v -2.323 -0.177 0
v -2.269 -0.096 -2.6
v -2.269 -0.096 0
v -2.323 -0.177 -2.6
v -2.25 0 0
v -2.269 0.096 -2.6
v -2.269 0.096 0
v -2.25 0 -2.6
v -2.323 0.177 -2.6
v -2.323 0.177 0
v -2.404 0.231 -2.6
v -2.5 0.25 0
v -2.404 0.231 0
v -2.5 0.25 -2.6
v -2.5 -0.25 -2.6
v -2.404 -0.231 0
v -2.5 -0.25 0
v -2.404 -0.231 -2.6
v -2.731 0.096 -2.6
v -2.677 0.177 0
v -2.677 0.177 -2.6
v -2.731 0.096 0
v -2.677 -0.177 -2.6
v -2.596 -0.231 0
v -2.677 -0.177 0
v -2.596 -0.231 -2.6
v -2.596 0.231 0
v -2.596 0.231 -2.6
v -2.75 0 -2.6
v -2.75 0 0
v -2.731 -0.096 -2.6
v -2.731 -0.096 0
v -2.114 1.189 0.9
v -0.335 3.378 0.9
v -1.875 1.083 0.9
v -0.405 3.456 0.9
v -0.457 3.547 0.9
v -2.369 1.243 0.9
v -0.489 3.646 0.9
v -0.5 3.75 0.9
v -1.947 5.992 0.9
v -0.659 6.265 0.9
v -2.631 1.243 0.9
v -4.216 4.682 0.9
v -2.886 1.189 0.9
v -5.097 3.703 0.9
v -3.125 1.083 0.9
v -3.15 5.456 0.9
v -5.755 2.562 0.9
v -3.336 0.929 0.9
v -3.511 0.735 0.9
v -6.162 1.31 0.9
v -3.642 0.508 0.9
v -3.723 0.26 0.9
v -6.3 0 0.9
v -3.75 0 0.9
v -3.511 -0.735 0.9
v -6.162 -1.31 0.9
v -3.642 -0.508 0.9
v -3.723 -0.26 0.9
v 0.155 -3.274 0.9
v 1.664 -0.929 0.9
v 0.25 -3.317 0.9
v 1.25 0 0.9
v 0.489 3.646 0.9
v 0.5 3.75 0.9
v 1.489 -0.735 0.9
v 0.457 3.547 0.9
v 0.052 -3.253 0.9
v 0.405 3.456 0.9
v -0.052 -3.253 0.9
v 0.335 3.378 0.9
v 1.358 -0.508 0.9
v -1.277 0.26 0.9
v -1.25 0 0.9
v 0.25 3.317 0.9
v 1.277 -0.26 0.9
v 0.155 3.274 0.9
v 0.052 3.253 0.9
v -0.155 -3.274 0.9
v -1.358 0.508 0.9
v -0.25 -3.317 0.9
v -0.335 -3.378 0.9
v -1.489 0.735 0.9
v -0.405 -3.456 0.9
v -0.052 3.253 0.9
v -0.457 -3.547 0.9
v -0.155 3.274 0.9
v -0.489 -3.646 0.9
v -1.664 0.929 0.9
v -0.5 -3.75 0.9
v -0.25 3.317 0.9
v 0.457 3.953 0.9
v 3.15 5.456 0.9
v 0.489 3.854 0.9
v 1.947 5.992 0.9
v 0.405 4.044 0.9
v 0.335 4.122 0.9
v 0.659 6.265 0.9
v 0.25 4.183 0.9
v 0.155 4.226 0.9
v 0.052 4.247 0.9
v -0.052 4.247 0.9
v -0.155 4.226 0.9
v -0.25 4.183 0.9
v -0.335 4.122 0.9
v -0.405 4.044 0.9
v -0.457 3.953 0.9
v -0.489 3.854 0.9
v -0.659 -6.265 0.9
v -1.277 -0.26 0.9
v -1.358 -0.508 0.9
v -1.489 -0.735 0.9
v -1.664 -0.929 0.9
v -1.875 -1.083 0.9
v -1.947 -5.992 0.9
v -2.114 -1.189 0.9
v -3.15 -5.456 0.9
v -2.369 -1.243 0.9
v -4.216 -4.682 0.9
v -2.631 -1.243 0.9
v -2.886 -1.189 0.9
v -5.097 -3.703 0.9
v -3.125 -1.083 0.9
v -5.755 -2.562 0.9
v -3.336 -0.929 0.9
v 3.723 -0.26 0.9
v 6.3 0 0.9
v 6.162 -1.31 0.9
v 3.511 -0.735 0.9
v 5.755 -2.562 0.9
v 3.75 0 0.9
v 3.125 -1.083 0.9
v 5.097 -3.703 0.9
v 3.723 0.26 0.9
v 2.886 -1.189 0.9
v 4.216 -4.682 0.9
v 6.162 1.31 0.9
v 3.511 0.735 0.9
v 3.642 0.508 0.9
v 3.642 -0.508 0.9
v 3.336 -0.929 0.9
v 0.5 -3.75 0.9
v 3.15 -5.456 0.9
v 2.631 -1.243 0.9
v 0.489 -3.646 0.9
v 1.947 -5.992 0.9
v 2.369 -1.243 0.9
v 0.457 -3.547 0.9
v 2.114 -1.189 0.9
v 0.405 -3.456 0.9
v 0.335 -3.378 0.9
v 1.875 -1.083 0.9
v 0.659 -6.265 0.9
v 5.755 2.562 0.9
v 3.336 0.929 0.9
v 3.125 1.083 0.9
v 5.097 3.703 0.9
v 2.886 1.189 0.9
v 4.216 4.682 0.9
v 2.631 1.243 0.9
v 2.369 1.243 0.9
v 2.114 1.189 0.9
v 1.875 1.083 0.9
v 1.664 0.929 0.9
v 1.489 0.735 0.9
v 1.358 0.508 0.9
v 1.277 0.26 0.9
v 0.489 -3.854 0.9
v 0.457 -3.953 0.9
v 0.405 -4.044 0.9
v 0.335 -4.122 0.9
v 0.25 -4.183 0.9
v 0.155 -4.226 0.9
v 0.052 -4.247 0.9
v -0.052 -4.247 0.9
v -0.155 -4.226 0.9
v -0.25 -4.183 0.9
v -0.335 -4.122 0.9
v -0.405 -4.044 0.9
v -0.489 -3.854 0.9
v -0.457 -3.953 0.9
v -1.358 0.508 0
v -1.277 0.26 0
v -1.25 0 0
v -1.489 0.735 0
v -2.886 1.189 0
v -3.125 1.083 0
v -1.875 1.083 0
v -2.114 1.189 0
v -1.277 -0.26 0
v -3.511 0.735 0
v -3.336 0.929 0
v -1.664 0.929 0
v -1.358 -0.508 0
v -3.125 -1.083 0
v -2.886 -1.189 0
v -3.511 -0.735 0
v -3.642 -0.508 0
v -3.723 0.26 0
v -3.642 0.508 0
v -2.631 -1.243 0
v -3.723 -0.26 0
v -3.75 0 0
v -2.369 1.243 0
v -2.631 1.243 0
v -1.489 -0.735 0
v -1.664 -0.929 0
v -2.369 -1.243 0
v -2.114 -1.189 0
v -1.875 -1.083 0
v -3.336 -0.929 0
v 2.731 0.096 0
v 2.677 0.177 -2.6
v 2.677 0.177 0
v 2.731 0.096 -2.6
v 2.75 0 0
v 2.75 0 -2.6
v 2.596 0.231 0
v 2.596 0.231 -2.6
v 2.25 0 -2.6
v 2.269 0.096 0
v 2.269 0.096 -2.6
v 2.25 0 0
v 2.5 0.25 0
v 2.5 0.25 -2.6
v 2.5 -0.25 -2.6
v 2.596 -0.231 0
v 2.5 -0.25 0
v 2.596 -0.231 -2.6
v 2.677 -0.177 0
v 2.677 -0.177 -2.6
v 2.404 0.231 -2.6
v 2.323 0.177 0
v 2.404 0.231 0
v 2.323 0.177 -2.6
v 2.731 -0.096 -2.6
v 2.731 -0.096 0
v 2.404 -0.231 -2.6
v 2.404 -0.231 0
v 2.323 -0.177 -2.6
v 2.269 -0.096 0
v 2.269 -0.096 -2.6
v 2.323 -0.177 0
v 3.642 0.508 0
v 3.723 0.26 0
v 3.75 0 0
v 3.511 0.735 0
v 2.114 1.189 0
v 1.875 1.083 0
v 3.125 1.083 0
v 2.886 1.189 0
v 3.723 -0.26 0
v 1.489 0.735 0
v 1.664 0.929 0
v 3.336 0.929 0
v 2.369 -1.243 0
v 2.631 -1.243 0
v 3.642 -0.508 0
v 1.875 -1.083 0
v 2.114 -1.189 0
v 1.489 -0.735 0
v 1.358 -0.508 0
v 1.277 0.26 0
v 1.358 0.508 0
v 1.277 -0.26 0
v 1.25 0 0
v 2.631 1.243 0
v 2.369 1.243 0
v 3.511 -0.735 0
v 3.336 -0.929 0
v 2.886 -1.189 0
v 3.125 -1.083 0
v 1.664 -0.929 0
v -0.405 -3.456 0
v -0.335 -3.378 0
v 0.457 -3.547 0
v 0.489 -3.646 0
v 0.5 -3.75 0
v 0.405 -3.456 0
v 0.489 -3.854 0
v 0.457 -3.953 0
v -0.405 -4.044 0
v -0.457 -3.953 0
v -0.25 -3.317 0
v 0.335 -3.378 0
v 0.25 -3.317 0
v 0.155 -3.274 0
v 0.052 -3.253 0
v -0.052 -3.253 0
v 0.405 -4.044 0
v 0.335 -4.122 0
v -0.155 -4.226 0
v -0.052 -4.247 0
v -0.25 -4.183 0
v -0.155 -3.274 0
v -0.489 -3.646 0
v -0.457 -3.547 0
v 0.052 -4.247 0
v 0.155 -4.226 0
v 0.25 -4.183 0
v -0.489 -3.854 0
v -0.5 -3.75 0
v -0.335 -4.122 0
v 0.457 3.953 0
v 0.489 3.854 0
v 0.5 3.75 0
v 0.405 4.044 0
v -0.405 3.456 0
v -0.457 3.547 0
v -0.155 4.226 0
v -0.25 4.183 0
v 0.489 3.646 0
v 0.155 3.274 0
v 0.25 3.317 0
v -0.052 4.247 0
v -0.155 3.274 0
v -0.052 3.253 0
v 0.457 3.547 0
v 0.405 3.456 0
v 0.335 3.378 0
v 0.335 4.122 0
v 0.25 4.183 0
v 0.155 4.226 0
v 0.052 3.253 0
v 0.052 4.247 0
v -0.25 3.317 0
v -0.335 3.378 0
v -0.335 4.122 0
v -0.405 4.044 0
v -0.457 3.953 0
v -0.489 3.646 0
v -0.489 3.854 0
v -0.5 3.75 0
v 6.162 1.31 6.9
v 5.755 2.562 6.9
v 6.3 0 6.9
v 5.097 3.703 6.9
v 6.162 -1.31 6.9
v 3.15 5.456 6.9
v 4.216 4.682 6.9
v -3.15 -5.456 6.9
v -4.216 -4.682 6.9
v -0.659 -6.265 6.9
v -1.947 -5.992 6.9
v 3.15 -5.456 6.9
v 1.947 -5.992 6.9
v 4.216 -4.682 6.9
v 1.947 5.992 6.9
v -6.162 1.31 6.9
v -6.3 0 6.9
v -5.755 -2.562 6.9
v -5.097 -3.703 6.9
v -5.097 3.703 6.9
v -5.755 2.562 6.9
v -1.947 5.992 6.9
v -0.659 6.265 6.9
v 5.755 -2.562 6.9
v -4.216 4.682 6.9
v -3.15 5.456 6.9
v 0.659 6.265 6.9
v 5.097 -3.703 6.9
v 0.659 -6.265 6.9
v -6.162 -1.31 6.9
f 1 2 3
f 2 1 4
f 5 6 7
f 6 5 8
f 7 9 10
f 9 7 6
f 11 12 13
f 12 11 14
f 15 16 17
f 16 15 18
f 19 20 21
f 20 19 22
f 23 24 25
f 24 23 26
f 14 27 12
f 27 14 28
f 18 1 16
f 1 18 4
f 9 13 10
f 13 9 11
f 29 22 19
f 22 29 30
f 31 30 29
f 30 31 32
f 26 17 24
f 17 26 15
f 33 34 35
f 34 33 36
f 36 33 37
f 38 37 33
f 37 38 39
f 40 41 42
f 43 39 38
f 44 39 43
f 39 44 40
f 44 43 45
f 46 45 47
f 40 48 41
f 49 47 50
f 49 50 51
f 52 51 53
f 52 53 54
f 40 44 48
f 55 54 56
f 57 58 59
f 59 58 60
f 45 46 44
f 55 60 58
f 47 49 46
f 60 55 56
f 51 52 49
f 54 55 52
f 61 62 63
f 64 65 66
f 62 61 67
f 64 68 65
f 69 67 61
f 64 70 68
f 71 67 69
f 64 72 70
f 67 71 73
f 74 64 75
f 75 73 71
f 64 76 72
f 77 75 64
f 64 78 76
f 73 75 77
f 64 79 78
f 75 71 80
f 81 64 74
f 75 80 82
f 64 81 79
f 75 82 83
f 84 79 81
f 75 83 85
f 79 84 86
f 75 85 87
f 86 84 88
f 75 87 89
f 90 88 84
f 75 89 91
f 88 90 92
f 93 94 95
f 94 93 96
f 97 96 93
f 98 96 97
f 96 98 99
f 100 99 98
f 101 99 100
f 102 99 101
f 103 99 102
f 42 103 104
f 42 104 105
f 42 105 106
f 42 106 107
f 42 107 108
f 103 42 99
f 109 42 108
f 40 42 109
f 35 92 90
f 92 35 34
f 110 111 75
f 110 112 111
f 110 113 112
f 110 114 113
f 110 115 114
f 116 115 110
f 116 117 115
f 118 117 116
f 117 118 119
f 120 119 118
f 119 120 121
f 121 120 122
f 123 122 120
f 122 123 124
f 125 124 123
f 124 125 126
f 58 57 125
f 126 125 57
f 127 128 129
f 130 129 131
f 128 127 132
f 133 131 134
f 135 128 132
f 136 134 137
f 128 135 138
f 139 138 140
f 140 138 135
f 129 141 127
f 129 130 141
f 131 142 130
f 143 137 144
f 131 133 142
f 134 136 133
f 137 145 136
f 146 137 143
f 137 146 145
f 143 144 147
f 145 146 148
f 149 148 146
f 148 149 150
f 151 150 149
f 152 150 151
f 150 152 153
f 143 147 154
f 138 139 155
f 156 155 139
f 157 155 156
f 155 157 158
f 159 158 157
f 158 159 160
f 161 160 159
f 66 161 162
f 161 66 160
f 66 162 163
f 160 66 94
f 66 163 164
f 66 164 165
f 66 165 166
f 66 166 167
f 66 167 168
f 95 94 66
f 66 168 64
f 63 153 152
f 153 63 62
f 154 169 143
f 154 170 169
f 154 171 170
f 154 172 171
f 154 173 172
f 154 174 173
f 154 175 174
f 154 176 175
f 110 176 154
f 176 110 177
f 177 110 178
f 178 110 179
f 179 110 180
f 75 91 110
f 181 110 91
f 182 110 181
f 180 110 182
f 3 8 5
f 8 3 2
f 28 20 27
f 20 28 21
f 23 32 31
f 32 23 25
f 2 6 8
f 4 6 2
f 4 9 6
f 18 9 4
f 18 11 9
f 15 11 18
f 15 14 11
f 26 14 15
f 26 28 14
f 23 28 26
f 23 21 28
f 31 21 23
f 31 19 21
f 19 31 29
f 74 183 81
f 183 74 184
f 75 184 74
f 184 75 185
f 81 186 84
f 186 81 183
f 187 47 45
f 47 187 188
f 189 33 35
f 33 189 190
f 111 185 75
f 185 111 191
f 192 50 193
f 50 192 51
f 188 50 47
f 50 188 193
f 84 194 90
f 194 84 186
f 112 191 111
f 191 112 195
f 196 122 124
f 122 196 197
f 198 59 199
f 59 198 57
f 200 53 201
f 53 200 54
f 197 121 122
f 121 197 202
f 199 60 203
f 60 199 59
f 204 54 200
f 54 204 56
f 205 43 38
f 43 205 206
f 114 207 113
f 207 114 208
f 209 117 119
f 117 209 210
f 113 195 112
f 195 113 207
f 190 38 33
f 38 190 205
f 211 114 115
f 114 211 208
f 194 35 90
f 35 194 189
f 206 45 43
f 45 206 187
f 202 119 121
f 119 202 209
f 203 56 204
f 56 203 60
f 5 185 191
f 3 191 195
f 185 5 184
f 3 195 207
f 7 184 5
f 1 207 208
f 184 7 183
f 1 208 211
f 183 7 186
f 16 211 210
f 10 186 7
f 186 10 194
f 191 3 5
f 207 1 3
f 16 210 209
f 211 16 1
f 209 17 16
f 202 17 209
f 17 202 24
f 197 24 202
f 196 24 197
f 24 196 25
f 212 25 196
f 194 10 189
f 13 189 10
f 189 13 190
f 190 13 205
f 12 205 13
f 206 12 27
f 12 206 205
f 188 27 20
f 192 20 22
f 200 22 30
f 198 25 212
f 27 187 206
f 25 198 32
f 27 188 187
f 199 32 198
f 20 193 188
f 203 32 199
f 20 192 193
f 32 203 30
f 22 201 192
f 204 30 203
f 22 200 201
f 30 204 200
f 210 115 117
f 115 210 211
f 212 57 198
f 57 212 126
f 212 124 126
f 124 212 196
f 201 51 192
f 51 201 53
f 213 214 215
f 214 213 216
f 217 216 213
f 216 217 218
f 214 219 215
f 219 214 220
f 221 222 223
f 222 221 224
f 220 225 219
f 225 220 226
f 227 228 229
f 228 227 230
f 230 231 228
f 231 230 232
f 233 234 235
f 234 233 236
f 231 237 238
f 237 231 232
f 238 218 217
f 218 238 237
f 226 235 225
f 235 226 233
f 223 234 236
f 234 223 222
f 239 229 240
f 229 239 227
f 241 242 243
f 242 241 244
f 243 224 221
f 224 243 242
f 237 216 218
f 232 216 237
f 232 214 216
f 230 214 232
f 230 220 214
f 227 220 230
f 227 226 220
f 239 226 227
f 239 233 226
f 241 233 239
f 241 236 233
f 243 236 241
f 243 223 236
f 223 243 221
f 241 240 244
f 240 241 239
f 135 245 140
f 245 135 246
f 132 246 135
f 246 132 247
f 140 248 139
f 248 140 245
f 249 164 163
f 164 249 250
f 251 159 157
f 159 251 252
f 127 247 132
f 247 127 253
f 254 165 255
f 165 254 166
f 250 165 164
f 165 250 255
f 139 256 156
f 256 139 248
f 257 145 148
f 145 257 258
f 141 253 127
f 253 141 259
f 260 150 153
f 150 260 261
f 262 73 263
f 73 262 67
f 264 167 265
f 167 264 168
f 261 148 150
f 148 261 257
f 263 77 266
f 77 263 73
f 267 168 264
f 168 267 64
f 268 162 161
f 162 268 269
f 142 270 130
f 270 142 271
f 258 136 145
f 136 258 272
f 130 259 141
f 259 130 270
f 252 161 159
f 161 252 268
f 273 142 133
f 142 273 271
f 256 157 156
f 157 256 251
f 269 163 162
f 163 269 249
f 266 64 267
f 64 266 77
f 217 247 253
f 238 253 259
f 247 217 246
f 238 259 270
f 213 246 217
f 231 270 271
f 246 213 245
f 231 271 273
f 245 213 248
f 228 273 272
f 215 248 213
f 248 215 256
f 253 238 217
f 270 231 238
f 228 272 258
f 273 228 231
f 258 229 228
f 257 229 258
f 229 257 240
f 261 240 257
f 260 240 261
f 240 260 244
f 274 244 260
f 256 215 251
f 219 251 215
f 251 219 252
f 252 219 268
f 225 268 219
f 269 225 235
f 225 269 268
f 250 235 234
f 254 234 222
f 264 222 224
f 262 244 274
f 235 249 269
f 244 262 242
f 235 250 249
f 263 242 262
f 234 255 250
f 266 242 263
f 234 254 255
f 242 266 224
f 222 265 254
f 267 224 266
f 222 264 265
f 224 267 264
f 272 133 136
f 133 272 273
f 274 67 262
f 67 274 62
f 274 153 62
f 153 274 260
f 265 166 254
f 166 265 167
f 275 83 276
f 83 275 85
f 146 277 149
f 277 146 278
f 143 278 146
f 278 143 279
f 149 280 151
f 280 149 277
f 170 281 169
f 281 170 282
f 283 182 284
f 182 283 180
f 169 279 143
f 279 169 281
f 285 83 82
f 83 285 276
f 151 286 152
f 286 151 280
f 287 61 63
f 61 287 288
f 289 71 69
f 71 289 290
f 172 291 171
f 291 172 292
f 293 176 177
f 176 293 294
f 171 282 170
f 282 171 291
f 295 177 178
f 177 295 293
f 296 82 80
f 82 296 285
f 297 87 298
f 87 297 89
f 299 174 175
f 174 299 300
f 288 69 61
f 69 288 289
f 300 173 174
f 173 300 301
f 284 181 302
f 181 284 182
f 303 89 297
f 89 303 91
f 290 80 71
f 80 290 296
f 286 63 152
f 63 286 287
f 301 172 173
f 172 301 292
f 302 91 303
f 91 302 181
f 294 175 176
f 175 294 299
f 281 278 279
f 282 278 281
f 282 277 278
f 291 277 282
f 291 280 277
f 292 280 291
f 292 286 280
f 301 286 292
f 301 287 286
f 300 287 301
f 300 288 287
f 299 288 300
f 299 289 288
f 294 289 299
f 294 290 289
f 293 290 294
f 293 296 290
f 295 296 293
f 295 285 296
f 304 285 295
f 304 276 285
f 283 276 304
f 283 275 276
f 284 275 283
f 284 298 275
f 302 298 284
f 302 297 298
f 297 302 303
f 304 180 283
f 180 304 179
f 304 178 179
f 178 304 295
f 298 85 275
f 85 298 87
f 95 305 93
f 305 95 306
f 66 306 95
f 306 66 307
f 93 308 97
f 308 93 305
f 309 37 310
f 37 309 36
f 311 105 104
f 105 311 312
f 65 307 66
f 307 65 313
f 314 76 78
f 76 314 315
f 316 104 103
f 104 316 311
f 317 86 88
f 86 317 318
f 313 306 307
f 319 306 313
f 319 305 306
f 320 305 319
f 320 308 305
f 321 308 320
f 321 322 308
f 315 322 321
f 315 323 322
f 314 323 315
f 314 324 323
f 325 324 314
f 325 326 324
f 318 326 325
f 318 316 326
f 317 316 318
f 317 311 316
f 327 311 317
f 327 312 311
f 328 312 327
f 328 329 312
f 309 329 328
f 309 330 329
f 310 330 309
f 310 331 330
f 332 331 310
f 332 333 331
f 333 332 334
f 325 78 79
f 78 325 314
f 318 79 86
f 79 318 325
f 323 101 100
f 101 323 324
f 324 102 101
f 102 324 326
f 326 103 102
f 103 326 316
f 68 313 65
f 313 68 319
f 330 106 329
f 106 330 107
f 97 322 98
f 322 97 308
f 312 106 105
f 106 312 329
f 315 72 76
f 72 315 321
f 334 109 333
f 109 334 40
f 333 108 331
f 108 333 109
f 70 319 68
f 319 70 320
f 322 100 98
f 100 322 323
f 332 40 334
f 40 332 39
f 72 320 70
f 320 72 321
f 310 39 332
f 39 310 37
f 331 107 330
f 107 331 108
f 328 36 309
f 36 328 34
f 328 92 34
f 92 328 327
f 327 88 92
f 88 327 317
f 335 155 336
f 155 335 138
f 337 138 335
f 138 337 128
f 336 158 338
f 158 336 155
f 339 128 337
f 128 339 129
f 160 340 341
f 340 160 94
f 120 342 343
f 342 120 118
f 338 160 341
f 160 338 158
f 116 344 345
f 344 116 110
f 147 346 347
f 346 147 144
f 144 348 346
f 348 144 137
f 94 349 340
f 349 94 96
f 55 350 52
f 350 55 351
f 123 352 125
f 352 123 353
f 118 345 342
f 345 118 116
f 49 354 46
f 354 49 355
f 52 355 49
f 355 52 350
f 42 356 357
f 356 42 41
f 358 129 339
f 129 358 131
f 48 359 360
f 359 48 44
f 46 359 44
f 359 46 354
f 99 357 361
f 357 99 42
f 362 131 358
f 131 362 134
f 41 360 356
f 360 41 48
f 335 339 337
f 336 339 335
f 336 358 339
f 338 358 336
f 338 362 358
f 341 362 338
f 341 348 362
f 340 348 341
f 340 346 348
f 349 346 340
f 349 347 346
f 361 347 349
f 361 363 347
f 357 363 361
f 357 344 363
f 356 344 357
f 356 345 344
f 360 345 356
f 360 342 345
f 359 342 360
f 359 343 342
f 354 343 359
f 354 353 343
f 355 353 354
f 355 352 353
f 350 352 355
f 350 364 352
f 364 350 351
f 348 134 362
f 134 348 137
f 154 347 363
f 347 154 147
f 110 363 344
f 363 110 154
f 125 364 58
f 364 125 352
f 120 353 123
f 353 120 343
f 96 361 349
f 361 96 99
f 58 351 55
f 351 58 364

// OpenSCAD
$fs=0.1;

murata_PKM12EPYH4002_B0();

// page 7: diaphram, external drive type
module murata_7BB_12_9  () {murata_7series(12.0, 9.0,  8.0, 0.22, 0.10);} // Brass
module murata_7BB_15_6  () {murata_7series(15.0, 10.0, 9.0, 0.22, 0.10);} // Brass
module murata_7BB_20_3  () {murata_7series(20.0, 14.0, 12.8, 0.22, 0.10);} // Brass
module murata_7BB_20_6  () {murata_7series(20.0, 14.0, 12.8, 0.42, 0.20);} // Brass
module murata_7BB_20_6L0() {murata_7series(20.0, 14.0, 12.8, 0.42, 0.20);} // Brass (with Lead Wire: AWG32 Length 50mm)
module murata_7BB_27_4  () {murata_7series(27.0, 19.7, 18.2, 0.54, 0.30);} // Brass
module murata_7BB_27_4L0() {murata_7series(27.0, 19.7, 18.2, 0.54, 0.30);} // Brass (with Lead Wire:AWG32 Length 50mm)
module murata_7BB_35_3  () {murata_7series(35.0, 25.0, 23.0, 0.53, 0.30);} // Brass
module murata_7BB_35_3L0() {murata_7series(35.0, 25.0, 23.0, 0.53, 0.30);} // Brass (with Lead Wire:AWG32 Length 50mm)
module murata_7BB_41_2  () {murata_7series(41.0, 25.0, 23.0, 0.63, 0.40);} // Brass
module murata_7BB_41_2L0() {murata_7series(41.0, 25.0, 23.0, 0.63, 0.40);} // Brass (with Lead Wire:AWG32 Length 50mm)
module murata_7NB_31R2_1() {murata_7series(31.2, 19.7, 18.2, 0.22, 0.10);} // Iron Nickel Alloy

// page 8: diaphram, self drive type
module murata_7BB_20_6C()   {murata_7series(20.0, 14.0, 12.8, 0.42, 0.20);} // Brass
module murata_7BB_20_6CL0() {murata_7series(20.0, 14.0, 12.8, 0.42, 0.20);} // Brass (with Lead Wire: AWG32 Length 50mm)
module murata_7BB_27_4C()   {murata_7series(27.0, 19.7, 18.2, 0.54, 0.30);} // Brass
module murata_7BB_27_4CL0() {murata_7series(27.0, 19.7, 18.2, 0.54, 0.30);} // Brass (with Lead Wire: AWG32 Length 50mm)
module murata_7BB_35_3C()   {murata_7series(35.0, 25.0, 23.0, 0.53, 0.30);} // Brass
module murata_7BB_35_3CL0() {murata_7series(35.0, 25.0, 23.0, 0.53, 0.30);} // Brass (with Lead Wire:AWG32 Length 50mm)
module murata_7BB_41_2C()   {murata_7series(41.0, 25.0, 23.0, 0.63, 0.40);} // Brass
module murata_7BB_41_2CL0() {murata_7series(41.0, 25.0, 23.0, 0.63, 0.40);} // Brass (with Lead Wire: AWG32 Length 50mm)
module murata_7SB_34R7_3C() {murata_7series(34.7, 25.0, 23.4, 0.50, 0.25);} // Stainless

// names are from http://docs-europe.electrocomponents.com/webdocs/0873/0900766b808736e6.pdf page 7
// D: plate size diameter (of lower bit)
// a: element size (thin plastic bit between the two metalic bits)
// b: electrode size (top metal bit)
// T: thickness (overall)
// t: plate thickness (top -- unclear if includes electrode)
module murata_7series(D, a, b, T, t) {
  plate_thick = t;
  element_thick = (T-t)/2;
  electrode_thick = (T-t)/2;
  cylinder(r=D/2, h=plate_thick);
  translate([0, 0, plate_thick])
    cylinder(r=a/2, h=element_thick);
  translate([0, 0, plate_thick+element_thick])
    cylinder(r=b/2, h=plate_thick);
}



// page 10: sounders, external drive, pin type
// These, somewhat oddly, don't have named parameters, just diagrams for each one, so the 
// parameter names here are my own invention.
module murata_PKM12EPYH4002_B0() {
 murata_PKM_cyl_type(od = 12.6, height_to_pcb = 6.9, height_gap = 0.9, lead_sep = 5.0, lead_dia = 0.5, lead_top_dia = 2.5, lead_len = 3.5, nub_dia = 1, nub_sep = 7.5);
}

module murata_PKM17EPP_2002_B0() {
 murata_PKM_cyl_type(od = 17.0, height_to_pcb = 8.6, height_gap = 1.2, lead_sep = 10.0, lead_dia = 0.5, lead_top_dia = 3.5, lead_len = 3.5, nub_dia = 1.2, nub_sep = 11);
}



module murata_PKM_cyl_type(od, height_to_pcb, height_gap, lead_sep, lead_dia, lead_top_dia, lead_len, nub_dia, nub_sep) {
 translate([0, 0, height_gap])
  cylinder(r=od/2, h=height_to_pcb-height_gap);

 // leads
 for (side=[-1, 1]) {
  translate([side * lead_sep/2, 0, 0]) {
   translate([0, 0, -lead_len+height_gap])
    cylinder(r=lead_dia/2, h=lead_len);
   cylinder(r=lead_top_dia/2, h=height_gap);
  }
 }

 // nubs
 for (side=[-1, 1]) {
  translate([0, side * nub_sep/2, 0]) {
   cylinder(r=nub_dia/2, h=height_gap);
  }
 }
}

murata_PKM12EPYH4002_B0();
